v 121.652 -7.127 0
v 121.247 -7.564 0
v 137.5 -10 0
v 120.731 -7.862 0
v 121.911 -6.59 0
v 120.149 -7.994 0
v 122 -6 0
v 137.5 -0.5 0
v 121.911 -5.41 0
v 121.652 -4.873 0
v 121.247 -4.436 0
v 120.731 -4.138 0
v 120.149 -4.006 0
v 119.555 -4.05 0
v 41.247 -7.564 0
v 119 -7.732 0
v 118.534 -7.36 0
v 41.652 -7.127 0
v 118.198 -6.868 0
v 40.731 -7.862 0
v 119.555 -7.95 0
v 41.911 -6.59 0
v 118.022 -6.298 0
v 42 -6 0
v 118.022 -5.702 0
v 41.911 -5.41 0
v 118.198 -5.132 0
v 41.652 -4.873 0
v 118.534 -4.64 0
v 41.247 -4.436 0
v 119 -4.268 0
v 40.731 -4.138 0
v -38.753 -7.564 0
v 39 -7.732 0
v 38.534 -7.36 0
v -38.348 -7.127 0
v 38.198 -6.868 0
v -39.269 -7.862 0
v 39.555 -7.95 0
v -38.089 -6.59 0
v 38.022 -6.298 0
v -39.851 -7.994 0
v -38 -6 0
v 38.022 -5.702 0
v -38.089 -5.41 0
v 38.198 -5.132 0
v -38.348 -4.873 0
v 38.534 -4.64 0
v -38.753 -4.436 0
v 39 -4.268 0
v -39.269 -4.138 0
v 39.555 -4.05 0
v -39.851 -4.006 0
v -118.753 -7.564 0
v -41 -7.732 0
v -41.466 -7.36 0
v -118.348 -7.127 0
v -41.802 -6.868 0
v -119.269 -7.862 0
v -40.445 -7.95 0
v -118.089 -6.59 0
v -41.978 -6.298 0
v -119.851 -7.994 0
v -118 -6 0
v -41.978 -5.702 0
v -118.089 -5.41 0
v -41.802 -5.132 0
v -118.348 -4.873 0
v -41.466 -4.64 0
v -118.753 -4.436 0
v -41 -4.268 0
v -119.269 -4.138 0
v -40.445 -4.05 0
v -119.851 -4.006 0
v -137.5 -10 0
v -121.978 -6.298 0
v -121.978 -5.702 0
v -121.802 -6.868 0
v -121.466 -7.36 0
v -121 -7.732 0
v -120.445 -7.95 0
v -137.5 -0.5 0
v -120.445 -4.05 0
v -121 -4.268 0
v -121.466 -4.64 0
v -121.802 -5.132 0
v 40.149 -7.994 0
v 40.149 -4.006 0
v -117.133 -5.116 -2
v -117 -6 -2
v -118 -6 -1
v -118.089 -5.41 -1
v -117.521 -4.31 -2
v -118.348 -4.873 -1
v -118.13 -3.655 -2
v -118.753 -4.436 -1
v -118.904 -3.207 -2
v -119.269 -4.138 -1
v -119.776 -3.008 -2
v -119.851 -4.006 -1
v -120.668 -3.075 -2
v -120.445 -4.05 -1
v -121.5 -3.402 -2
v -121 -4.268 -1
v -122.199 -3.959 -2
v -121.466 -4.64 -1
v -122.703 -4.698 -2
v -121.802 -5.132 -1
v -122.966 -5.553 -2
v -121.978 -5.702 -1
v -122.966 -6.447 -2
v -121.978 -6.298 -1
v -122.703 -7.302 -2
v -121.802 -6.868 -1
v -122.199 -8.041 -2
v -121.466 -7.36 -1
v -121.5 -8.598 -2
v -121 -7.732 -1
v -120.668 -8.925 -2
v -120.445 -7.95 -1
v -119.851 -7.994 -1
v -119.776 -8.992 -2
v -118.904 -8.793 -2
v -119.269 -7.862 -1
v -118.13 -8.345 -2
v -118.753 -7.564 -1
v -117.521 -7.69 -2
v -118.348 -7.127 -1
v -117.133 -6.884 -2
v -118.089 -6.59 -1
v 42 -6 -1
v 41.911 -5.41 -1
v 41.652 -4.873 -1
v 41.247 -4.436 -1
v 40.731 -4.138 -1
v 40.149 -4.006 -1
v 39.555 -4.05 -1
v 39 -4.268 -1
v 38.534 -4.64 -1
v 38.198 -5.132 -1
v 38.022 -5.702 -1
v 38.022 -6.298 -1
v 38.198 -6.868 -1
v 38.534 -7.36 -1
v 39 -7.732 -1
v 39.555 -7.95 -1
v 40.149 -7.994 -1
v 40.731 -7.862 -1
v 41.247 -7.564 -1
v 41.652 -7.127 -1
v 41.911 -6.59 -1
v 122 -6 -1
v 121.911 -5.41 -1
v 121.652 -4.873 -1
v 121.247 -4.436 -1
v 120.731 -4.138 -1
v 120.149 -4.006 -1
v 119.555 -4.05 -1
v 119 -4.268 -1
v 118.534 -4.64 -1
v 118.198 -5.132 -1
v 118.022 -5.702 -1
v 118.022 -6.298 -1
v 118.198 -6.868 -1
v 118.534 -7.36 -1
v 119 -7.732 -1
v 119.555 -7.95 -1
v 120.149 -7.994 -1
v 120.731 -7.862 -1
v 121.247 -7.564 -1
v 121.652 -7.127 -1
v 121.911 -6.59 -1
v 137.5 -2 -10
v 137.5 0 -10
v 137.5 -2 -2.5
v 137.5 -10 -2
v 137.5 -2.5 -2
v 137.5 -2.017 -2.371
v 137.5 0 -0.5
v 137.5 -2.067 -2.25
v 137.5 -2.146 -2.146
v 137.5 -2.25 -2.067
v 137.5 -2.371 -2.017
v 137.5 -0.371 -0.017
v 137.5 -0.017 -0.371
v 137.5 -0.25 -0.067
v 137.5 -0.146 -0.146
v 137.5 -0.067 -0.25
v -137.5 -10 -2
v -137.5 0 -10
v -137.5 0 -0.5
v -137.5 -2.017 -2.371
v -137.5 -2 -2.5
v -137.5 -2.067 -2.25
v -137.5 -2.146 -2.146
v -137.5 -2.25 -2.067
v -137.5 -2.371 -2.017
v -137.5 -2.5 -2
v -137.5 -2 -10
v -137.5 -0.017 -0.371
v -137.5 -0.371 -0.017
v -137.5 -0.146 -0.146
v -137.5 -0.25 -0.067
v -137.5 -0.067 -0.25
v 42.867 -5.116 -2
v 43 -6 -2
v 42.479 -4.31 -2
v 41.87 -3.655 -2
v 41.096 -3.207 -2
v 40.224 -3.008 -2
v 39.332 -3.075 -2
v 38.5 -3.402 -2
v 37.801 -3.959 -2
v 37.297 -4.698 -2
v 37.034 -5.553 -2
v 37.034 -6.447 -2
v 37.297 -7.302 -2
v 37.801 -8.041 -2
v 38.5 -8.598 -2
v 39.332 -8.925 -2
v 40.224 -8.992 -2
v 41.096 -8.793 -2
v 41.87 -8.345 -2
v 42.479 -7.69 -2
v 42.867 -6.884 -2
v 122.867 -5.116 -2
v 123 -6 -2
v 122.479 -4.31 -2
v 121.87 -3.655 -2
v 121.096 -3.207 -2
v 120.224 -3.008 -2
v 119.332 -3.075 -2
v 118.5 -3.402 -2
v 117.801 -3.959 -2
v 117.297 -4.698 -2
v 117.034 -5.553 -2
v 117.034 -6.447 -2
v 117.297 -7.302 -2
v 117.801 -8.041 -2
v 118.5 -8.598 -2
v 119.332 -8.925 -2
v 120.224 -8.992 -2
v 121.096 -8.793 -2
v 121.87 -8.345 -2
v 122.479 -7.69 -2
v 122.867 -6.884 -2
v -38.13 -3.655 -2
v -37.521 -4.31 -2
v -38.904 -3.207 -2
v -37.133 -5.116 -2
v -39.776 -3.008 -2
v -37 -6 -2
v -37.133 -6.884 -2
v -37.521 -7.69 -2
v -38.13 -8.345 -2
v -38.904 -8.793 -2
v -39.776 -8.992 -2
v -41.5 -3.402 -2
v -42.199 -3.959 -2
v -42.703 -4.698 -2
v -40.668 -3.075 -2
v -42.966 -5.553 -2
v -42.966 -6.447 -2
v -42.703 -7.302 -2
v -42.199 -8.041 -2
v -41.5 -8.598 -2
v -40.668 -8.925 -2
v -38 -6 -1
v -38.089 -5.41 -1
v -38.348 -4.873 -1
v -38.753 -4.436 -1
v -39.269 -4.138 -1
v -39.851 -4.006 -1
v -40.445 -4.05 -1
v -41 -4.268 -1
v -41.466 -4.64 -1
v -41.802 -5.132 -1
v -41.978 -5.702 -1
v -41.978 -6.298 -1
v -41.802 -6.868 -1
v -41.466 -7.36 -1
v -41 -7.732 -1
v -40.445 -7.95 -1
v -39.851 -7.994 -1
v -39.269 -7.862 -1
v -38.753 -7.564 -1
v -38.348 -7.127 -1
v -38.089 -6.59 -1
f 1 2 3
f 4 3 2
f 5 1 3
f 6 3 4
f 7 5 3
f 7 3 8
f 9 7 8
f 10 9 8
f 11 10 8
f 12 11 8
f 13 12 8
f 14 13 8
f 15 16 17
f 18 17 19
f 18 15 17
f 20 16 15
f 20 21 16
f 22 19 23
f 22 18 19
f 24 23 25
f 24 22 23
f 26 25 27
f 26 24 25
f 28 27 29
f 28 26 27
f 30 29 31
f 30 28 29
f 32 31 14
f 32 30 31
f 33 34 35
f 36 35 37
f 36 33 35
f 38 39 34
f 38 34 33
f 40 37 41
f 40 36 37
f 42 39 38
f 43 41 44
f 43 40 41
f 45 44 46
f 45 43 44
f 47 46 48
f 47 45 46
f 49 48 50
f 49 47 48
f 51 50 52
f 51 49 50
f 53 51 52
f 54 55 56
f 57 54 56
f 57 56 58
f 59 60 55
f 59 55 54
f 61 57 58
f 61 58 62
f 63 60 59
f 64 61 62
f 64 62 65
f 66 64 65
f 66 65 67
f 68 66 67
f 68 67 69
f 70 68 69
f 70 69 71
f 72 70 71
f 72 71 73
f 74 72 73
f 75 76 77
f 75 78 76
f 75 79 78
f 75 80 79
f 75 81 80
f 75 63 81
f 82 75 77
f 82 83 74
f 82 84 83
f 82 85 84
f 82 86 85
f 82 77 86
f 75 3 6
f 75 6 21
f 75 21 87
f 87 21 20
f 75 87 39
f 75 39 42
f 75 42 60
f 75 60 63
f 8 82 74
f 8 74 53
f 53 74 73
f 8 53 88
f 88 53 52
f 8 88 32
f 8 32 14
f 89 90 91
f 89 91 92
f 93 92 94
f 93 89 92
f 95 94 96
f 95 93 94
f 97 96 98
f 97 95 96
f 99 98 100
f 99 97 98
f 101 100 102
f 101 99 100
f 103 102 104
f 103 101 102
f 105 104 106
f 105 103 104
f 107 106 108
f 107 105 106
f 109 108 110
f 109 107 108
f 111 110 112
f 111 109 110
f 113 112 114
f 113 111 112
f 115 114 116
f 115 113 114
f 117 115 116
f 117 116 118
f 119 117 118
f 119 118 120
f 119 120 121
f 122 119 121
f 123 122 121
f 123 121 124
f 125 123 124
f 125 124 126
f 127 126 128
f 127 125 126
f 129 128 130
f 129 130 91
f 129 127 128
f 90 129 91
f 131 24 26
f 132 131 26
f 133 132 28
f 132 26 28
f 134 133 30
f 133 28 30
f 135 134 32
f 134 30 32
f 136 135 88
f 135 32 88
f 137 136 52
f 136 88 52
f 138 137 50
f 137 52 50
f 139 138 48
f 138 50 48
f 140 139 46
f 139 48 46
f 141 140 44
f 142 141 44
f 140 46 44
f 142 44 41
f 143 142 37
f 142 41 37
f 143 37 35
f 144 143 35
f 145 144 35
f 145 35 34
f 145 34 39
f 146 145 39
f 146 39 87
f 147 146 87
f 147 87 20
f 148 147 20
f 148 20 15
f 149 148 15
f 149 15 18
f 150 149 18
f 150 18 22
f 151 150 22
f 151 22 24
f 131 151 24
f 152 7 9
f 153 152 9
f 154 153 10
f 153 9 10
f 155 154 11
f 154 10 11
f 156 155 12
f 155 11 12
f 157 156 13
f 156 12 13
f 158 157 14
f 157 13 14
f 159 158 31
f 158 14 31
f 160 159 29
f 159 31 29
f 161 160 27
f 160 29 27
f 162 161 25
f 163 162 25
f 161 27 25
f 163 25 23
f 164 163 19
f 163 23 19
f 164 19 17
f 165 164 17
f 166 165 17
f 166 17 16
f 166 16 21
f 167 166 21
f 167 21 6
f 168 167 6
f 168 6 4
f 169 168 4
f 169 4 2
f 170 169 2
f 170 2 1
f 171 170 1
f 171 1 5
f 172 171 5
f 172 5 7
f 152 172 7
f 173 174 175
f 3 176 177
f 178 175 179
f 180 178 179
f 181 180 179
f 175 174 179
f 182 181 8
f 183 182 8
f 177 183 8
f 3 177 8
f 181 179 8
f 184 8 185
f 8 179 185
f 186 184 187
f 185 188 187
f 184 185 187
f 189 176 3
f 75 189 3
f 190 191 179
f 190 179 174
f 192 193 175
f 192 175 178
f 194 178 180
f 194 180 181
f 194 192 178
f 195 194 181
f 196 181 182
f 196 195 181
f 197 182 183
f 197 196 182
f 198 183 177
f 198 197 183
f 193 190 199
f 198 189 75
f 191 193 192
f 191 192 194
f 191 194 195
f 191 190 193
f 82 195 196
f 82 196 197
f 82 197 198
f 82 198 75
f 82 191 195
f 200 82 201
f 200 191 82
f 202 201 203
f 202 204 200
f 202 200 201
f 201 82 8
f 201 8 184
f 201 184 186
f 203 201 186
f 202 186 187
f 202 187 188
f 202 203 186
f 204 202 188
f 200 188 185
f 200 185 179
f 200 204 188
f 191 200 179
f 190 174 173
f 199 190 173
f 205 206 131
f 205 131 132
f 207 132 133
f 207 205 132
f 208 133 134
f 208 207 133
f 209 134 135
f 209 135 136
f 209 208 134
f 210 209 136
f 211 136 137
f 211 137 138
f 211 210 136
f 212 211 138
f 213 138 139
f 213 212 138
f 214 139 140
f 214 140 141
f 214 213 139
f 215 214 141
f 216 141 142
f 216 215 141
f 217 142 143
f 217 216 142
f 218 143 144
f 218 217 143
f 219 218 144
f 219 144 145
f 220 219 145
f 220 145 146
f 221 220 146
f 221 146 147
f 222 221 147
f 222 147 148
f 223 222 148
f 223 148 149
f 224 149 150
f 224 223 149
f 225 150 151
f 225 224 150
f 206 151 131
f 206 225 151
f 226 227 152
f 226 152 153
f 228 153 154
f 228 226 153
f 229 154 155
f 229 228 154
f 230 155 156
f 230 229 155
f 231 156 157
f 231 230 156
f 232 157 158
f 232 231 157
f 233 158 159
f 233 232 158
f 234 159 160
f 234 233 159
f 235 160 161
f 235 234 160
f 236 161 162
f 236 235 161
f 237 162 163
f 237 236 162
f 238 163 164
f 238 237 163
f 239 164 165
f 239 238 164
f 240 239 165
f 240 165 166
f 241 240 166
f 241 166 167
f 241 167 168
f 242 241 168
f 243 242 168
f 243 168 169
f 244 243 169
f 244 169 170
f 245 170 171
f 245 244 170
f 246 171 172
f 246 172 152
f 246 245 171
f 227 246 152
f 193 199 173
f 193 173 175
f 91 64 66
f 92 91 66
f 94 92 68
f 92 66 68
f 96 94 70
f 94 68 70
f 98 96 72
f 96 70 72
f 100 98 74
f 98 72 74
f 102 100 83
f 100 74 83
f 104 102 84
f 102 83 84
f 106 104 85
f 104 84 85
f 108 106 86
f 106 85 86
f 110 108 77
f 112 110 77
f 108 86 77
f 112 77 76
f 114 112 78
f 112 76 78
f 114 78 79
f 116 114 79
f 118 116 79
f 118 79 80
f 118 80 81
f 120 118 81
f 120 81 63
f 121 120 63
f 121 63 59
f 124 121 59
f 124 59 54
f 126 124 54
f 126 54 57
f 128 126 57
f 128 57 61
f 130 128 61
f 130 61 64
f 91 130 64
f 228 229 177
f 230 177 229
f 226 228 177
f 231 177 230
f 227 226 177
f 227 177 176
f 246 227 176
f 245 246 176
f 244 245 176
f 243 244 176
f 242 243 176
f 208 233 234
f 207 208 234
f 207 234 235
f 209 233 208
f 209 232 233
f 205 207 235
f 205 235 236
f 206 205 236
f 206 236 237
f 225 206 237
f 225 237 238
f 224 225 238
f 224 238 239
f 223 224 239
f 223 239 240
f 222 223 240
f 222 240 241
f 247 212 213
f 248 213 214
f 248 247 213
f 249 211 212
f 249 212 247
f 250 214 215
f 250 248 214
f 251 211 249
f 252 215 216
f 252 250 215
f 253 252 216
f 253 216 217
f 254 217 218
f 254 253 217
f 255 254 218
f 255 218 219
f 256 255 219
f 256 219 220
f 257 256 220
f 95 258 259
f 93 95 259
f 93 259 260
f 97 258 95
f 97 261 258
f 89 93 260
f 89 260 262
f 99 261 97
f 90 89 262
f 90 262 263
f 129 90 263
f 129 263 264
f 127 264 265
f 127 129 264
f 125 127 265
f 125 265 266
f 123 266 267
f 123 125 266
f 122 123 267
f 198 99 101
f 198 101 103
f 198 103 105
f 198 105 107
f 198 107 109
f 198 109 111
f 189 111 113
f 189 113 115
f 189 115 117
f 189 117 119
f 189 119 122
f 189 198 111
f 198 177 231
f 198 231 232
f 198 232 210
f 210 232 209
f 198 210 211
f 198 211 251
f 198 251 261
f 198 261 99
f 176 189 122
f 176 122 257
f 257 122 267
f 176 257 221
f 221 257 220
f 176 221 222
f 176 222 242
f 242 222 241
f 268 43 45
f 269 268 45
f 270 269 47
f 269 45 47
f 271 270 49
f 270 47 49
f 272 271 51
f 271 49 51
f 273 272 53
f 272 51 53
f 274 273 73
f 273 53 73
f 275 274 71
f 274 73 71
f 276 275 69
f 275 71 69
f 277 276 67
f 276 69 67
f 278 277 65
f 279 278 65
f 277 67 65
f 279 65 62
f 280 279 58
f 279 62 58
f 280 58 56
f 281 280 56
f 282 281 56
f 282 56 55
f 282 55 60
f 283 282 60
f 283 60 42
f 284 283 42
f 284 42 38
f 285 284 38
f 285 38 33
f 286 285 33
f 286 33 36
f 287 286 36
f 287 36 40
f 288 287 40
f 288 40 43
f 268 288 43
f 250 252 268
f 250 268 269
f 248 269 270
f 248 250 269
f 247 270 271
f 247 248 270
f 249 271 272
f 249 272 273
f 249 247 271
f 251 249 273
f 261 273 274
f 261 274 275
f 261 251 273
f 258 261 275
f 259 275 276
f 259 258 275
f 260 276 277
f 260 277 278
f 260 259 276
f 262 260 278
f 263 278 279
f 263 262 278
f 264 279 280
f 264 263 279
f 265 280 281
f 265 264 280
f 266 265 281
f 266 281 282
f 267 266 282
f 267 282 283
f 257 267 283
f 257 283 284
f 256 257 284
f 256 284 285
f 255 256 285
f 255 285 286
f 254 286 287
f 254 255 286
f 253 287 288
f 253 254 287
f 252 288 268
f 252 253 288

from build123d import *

# Parameters (mm, degrees)
BOSS_EXTRUDE1_DEPTH      = 137.5
BOSS_EXTRUDE1_DEPTH_BACK = 137.5
SKETCH2_R                = 2
CUT_EXTRUDE1_DEPTH       = 139.225359468
CHAMFER1_SIZE            = 1


with BuildPart() as part:
    # Sketch1 → Boss-Extrude1 (new, two sides: drawn at the far end of the back side and taken through both)
    with BuildSketch(Plane(origin=(0, 0, 0), x_dir=(0, 0, -1), z_dir=(1, 0, 0)).offset(-BOSS_EXTRUDE1_DEPTH_BACK)):
        with BuildLine():
            Line((0, -10), (0, -0.5))
            ThreePointArc((0, -0.5), (0.146446609, -0.146446609), (0.5, 0))
            Line((0.5, 0), (10, 0))
            Line((10, 0), (10, -2))
            Line((10, -2), (2.5, -2))
            ThreePointArc((2.5, -2), (2.146446609, -2.146446609), (2, -2.5))
            Line((2, -2.5), (2, -10))
            Line((2, -10), (0, -10))
        make_face()
    extrude(amount=BOSS_EXTRUDE1_DEPTH + BOSS_EXTRUDE1_DEPTH_BACK)

    # Sketch2 → Cut-Extrude1 (cut, through all)
    with BuildSketch(Plane.XY):
        with Locations((-120, -6)):
            Circle(SKETCH2_R)
        with Locations((-40, -6)):
            Circle(SKETCH2_R)
        with Locations((40, -6)):
            Circle(SKETCH2_R)
        with Locations((120, -6)):
            Circle(SKETCH2_R)
    extrude(amount=-CUT_EXTRUDE1_DEPTH, mode=Mode.SUBTRACT)

    # Chamfer1
    chamfer1_edges = [part.edges().sort_by_distance(p)[0] for p in [
        (-122, -6, -2),
        (-42, -6, -2),
        (38, -6, -2),
        (118, -6, -2),
    ]]
    chamfer(chamfer1_edges, length=CHAMFER1_SIZE)


solid = part.part
